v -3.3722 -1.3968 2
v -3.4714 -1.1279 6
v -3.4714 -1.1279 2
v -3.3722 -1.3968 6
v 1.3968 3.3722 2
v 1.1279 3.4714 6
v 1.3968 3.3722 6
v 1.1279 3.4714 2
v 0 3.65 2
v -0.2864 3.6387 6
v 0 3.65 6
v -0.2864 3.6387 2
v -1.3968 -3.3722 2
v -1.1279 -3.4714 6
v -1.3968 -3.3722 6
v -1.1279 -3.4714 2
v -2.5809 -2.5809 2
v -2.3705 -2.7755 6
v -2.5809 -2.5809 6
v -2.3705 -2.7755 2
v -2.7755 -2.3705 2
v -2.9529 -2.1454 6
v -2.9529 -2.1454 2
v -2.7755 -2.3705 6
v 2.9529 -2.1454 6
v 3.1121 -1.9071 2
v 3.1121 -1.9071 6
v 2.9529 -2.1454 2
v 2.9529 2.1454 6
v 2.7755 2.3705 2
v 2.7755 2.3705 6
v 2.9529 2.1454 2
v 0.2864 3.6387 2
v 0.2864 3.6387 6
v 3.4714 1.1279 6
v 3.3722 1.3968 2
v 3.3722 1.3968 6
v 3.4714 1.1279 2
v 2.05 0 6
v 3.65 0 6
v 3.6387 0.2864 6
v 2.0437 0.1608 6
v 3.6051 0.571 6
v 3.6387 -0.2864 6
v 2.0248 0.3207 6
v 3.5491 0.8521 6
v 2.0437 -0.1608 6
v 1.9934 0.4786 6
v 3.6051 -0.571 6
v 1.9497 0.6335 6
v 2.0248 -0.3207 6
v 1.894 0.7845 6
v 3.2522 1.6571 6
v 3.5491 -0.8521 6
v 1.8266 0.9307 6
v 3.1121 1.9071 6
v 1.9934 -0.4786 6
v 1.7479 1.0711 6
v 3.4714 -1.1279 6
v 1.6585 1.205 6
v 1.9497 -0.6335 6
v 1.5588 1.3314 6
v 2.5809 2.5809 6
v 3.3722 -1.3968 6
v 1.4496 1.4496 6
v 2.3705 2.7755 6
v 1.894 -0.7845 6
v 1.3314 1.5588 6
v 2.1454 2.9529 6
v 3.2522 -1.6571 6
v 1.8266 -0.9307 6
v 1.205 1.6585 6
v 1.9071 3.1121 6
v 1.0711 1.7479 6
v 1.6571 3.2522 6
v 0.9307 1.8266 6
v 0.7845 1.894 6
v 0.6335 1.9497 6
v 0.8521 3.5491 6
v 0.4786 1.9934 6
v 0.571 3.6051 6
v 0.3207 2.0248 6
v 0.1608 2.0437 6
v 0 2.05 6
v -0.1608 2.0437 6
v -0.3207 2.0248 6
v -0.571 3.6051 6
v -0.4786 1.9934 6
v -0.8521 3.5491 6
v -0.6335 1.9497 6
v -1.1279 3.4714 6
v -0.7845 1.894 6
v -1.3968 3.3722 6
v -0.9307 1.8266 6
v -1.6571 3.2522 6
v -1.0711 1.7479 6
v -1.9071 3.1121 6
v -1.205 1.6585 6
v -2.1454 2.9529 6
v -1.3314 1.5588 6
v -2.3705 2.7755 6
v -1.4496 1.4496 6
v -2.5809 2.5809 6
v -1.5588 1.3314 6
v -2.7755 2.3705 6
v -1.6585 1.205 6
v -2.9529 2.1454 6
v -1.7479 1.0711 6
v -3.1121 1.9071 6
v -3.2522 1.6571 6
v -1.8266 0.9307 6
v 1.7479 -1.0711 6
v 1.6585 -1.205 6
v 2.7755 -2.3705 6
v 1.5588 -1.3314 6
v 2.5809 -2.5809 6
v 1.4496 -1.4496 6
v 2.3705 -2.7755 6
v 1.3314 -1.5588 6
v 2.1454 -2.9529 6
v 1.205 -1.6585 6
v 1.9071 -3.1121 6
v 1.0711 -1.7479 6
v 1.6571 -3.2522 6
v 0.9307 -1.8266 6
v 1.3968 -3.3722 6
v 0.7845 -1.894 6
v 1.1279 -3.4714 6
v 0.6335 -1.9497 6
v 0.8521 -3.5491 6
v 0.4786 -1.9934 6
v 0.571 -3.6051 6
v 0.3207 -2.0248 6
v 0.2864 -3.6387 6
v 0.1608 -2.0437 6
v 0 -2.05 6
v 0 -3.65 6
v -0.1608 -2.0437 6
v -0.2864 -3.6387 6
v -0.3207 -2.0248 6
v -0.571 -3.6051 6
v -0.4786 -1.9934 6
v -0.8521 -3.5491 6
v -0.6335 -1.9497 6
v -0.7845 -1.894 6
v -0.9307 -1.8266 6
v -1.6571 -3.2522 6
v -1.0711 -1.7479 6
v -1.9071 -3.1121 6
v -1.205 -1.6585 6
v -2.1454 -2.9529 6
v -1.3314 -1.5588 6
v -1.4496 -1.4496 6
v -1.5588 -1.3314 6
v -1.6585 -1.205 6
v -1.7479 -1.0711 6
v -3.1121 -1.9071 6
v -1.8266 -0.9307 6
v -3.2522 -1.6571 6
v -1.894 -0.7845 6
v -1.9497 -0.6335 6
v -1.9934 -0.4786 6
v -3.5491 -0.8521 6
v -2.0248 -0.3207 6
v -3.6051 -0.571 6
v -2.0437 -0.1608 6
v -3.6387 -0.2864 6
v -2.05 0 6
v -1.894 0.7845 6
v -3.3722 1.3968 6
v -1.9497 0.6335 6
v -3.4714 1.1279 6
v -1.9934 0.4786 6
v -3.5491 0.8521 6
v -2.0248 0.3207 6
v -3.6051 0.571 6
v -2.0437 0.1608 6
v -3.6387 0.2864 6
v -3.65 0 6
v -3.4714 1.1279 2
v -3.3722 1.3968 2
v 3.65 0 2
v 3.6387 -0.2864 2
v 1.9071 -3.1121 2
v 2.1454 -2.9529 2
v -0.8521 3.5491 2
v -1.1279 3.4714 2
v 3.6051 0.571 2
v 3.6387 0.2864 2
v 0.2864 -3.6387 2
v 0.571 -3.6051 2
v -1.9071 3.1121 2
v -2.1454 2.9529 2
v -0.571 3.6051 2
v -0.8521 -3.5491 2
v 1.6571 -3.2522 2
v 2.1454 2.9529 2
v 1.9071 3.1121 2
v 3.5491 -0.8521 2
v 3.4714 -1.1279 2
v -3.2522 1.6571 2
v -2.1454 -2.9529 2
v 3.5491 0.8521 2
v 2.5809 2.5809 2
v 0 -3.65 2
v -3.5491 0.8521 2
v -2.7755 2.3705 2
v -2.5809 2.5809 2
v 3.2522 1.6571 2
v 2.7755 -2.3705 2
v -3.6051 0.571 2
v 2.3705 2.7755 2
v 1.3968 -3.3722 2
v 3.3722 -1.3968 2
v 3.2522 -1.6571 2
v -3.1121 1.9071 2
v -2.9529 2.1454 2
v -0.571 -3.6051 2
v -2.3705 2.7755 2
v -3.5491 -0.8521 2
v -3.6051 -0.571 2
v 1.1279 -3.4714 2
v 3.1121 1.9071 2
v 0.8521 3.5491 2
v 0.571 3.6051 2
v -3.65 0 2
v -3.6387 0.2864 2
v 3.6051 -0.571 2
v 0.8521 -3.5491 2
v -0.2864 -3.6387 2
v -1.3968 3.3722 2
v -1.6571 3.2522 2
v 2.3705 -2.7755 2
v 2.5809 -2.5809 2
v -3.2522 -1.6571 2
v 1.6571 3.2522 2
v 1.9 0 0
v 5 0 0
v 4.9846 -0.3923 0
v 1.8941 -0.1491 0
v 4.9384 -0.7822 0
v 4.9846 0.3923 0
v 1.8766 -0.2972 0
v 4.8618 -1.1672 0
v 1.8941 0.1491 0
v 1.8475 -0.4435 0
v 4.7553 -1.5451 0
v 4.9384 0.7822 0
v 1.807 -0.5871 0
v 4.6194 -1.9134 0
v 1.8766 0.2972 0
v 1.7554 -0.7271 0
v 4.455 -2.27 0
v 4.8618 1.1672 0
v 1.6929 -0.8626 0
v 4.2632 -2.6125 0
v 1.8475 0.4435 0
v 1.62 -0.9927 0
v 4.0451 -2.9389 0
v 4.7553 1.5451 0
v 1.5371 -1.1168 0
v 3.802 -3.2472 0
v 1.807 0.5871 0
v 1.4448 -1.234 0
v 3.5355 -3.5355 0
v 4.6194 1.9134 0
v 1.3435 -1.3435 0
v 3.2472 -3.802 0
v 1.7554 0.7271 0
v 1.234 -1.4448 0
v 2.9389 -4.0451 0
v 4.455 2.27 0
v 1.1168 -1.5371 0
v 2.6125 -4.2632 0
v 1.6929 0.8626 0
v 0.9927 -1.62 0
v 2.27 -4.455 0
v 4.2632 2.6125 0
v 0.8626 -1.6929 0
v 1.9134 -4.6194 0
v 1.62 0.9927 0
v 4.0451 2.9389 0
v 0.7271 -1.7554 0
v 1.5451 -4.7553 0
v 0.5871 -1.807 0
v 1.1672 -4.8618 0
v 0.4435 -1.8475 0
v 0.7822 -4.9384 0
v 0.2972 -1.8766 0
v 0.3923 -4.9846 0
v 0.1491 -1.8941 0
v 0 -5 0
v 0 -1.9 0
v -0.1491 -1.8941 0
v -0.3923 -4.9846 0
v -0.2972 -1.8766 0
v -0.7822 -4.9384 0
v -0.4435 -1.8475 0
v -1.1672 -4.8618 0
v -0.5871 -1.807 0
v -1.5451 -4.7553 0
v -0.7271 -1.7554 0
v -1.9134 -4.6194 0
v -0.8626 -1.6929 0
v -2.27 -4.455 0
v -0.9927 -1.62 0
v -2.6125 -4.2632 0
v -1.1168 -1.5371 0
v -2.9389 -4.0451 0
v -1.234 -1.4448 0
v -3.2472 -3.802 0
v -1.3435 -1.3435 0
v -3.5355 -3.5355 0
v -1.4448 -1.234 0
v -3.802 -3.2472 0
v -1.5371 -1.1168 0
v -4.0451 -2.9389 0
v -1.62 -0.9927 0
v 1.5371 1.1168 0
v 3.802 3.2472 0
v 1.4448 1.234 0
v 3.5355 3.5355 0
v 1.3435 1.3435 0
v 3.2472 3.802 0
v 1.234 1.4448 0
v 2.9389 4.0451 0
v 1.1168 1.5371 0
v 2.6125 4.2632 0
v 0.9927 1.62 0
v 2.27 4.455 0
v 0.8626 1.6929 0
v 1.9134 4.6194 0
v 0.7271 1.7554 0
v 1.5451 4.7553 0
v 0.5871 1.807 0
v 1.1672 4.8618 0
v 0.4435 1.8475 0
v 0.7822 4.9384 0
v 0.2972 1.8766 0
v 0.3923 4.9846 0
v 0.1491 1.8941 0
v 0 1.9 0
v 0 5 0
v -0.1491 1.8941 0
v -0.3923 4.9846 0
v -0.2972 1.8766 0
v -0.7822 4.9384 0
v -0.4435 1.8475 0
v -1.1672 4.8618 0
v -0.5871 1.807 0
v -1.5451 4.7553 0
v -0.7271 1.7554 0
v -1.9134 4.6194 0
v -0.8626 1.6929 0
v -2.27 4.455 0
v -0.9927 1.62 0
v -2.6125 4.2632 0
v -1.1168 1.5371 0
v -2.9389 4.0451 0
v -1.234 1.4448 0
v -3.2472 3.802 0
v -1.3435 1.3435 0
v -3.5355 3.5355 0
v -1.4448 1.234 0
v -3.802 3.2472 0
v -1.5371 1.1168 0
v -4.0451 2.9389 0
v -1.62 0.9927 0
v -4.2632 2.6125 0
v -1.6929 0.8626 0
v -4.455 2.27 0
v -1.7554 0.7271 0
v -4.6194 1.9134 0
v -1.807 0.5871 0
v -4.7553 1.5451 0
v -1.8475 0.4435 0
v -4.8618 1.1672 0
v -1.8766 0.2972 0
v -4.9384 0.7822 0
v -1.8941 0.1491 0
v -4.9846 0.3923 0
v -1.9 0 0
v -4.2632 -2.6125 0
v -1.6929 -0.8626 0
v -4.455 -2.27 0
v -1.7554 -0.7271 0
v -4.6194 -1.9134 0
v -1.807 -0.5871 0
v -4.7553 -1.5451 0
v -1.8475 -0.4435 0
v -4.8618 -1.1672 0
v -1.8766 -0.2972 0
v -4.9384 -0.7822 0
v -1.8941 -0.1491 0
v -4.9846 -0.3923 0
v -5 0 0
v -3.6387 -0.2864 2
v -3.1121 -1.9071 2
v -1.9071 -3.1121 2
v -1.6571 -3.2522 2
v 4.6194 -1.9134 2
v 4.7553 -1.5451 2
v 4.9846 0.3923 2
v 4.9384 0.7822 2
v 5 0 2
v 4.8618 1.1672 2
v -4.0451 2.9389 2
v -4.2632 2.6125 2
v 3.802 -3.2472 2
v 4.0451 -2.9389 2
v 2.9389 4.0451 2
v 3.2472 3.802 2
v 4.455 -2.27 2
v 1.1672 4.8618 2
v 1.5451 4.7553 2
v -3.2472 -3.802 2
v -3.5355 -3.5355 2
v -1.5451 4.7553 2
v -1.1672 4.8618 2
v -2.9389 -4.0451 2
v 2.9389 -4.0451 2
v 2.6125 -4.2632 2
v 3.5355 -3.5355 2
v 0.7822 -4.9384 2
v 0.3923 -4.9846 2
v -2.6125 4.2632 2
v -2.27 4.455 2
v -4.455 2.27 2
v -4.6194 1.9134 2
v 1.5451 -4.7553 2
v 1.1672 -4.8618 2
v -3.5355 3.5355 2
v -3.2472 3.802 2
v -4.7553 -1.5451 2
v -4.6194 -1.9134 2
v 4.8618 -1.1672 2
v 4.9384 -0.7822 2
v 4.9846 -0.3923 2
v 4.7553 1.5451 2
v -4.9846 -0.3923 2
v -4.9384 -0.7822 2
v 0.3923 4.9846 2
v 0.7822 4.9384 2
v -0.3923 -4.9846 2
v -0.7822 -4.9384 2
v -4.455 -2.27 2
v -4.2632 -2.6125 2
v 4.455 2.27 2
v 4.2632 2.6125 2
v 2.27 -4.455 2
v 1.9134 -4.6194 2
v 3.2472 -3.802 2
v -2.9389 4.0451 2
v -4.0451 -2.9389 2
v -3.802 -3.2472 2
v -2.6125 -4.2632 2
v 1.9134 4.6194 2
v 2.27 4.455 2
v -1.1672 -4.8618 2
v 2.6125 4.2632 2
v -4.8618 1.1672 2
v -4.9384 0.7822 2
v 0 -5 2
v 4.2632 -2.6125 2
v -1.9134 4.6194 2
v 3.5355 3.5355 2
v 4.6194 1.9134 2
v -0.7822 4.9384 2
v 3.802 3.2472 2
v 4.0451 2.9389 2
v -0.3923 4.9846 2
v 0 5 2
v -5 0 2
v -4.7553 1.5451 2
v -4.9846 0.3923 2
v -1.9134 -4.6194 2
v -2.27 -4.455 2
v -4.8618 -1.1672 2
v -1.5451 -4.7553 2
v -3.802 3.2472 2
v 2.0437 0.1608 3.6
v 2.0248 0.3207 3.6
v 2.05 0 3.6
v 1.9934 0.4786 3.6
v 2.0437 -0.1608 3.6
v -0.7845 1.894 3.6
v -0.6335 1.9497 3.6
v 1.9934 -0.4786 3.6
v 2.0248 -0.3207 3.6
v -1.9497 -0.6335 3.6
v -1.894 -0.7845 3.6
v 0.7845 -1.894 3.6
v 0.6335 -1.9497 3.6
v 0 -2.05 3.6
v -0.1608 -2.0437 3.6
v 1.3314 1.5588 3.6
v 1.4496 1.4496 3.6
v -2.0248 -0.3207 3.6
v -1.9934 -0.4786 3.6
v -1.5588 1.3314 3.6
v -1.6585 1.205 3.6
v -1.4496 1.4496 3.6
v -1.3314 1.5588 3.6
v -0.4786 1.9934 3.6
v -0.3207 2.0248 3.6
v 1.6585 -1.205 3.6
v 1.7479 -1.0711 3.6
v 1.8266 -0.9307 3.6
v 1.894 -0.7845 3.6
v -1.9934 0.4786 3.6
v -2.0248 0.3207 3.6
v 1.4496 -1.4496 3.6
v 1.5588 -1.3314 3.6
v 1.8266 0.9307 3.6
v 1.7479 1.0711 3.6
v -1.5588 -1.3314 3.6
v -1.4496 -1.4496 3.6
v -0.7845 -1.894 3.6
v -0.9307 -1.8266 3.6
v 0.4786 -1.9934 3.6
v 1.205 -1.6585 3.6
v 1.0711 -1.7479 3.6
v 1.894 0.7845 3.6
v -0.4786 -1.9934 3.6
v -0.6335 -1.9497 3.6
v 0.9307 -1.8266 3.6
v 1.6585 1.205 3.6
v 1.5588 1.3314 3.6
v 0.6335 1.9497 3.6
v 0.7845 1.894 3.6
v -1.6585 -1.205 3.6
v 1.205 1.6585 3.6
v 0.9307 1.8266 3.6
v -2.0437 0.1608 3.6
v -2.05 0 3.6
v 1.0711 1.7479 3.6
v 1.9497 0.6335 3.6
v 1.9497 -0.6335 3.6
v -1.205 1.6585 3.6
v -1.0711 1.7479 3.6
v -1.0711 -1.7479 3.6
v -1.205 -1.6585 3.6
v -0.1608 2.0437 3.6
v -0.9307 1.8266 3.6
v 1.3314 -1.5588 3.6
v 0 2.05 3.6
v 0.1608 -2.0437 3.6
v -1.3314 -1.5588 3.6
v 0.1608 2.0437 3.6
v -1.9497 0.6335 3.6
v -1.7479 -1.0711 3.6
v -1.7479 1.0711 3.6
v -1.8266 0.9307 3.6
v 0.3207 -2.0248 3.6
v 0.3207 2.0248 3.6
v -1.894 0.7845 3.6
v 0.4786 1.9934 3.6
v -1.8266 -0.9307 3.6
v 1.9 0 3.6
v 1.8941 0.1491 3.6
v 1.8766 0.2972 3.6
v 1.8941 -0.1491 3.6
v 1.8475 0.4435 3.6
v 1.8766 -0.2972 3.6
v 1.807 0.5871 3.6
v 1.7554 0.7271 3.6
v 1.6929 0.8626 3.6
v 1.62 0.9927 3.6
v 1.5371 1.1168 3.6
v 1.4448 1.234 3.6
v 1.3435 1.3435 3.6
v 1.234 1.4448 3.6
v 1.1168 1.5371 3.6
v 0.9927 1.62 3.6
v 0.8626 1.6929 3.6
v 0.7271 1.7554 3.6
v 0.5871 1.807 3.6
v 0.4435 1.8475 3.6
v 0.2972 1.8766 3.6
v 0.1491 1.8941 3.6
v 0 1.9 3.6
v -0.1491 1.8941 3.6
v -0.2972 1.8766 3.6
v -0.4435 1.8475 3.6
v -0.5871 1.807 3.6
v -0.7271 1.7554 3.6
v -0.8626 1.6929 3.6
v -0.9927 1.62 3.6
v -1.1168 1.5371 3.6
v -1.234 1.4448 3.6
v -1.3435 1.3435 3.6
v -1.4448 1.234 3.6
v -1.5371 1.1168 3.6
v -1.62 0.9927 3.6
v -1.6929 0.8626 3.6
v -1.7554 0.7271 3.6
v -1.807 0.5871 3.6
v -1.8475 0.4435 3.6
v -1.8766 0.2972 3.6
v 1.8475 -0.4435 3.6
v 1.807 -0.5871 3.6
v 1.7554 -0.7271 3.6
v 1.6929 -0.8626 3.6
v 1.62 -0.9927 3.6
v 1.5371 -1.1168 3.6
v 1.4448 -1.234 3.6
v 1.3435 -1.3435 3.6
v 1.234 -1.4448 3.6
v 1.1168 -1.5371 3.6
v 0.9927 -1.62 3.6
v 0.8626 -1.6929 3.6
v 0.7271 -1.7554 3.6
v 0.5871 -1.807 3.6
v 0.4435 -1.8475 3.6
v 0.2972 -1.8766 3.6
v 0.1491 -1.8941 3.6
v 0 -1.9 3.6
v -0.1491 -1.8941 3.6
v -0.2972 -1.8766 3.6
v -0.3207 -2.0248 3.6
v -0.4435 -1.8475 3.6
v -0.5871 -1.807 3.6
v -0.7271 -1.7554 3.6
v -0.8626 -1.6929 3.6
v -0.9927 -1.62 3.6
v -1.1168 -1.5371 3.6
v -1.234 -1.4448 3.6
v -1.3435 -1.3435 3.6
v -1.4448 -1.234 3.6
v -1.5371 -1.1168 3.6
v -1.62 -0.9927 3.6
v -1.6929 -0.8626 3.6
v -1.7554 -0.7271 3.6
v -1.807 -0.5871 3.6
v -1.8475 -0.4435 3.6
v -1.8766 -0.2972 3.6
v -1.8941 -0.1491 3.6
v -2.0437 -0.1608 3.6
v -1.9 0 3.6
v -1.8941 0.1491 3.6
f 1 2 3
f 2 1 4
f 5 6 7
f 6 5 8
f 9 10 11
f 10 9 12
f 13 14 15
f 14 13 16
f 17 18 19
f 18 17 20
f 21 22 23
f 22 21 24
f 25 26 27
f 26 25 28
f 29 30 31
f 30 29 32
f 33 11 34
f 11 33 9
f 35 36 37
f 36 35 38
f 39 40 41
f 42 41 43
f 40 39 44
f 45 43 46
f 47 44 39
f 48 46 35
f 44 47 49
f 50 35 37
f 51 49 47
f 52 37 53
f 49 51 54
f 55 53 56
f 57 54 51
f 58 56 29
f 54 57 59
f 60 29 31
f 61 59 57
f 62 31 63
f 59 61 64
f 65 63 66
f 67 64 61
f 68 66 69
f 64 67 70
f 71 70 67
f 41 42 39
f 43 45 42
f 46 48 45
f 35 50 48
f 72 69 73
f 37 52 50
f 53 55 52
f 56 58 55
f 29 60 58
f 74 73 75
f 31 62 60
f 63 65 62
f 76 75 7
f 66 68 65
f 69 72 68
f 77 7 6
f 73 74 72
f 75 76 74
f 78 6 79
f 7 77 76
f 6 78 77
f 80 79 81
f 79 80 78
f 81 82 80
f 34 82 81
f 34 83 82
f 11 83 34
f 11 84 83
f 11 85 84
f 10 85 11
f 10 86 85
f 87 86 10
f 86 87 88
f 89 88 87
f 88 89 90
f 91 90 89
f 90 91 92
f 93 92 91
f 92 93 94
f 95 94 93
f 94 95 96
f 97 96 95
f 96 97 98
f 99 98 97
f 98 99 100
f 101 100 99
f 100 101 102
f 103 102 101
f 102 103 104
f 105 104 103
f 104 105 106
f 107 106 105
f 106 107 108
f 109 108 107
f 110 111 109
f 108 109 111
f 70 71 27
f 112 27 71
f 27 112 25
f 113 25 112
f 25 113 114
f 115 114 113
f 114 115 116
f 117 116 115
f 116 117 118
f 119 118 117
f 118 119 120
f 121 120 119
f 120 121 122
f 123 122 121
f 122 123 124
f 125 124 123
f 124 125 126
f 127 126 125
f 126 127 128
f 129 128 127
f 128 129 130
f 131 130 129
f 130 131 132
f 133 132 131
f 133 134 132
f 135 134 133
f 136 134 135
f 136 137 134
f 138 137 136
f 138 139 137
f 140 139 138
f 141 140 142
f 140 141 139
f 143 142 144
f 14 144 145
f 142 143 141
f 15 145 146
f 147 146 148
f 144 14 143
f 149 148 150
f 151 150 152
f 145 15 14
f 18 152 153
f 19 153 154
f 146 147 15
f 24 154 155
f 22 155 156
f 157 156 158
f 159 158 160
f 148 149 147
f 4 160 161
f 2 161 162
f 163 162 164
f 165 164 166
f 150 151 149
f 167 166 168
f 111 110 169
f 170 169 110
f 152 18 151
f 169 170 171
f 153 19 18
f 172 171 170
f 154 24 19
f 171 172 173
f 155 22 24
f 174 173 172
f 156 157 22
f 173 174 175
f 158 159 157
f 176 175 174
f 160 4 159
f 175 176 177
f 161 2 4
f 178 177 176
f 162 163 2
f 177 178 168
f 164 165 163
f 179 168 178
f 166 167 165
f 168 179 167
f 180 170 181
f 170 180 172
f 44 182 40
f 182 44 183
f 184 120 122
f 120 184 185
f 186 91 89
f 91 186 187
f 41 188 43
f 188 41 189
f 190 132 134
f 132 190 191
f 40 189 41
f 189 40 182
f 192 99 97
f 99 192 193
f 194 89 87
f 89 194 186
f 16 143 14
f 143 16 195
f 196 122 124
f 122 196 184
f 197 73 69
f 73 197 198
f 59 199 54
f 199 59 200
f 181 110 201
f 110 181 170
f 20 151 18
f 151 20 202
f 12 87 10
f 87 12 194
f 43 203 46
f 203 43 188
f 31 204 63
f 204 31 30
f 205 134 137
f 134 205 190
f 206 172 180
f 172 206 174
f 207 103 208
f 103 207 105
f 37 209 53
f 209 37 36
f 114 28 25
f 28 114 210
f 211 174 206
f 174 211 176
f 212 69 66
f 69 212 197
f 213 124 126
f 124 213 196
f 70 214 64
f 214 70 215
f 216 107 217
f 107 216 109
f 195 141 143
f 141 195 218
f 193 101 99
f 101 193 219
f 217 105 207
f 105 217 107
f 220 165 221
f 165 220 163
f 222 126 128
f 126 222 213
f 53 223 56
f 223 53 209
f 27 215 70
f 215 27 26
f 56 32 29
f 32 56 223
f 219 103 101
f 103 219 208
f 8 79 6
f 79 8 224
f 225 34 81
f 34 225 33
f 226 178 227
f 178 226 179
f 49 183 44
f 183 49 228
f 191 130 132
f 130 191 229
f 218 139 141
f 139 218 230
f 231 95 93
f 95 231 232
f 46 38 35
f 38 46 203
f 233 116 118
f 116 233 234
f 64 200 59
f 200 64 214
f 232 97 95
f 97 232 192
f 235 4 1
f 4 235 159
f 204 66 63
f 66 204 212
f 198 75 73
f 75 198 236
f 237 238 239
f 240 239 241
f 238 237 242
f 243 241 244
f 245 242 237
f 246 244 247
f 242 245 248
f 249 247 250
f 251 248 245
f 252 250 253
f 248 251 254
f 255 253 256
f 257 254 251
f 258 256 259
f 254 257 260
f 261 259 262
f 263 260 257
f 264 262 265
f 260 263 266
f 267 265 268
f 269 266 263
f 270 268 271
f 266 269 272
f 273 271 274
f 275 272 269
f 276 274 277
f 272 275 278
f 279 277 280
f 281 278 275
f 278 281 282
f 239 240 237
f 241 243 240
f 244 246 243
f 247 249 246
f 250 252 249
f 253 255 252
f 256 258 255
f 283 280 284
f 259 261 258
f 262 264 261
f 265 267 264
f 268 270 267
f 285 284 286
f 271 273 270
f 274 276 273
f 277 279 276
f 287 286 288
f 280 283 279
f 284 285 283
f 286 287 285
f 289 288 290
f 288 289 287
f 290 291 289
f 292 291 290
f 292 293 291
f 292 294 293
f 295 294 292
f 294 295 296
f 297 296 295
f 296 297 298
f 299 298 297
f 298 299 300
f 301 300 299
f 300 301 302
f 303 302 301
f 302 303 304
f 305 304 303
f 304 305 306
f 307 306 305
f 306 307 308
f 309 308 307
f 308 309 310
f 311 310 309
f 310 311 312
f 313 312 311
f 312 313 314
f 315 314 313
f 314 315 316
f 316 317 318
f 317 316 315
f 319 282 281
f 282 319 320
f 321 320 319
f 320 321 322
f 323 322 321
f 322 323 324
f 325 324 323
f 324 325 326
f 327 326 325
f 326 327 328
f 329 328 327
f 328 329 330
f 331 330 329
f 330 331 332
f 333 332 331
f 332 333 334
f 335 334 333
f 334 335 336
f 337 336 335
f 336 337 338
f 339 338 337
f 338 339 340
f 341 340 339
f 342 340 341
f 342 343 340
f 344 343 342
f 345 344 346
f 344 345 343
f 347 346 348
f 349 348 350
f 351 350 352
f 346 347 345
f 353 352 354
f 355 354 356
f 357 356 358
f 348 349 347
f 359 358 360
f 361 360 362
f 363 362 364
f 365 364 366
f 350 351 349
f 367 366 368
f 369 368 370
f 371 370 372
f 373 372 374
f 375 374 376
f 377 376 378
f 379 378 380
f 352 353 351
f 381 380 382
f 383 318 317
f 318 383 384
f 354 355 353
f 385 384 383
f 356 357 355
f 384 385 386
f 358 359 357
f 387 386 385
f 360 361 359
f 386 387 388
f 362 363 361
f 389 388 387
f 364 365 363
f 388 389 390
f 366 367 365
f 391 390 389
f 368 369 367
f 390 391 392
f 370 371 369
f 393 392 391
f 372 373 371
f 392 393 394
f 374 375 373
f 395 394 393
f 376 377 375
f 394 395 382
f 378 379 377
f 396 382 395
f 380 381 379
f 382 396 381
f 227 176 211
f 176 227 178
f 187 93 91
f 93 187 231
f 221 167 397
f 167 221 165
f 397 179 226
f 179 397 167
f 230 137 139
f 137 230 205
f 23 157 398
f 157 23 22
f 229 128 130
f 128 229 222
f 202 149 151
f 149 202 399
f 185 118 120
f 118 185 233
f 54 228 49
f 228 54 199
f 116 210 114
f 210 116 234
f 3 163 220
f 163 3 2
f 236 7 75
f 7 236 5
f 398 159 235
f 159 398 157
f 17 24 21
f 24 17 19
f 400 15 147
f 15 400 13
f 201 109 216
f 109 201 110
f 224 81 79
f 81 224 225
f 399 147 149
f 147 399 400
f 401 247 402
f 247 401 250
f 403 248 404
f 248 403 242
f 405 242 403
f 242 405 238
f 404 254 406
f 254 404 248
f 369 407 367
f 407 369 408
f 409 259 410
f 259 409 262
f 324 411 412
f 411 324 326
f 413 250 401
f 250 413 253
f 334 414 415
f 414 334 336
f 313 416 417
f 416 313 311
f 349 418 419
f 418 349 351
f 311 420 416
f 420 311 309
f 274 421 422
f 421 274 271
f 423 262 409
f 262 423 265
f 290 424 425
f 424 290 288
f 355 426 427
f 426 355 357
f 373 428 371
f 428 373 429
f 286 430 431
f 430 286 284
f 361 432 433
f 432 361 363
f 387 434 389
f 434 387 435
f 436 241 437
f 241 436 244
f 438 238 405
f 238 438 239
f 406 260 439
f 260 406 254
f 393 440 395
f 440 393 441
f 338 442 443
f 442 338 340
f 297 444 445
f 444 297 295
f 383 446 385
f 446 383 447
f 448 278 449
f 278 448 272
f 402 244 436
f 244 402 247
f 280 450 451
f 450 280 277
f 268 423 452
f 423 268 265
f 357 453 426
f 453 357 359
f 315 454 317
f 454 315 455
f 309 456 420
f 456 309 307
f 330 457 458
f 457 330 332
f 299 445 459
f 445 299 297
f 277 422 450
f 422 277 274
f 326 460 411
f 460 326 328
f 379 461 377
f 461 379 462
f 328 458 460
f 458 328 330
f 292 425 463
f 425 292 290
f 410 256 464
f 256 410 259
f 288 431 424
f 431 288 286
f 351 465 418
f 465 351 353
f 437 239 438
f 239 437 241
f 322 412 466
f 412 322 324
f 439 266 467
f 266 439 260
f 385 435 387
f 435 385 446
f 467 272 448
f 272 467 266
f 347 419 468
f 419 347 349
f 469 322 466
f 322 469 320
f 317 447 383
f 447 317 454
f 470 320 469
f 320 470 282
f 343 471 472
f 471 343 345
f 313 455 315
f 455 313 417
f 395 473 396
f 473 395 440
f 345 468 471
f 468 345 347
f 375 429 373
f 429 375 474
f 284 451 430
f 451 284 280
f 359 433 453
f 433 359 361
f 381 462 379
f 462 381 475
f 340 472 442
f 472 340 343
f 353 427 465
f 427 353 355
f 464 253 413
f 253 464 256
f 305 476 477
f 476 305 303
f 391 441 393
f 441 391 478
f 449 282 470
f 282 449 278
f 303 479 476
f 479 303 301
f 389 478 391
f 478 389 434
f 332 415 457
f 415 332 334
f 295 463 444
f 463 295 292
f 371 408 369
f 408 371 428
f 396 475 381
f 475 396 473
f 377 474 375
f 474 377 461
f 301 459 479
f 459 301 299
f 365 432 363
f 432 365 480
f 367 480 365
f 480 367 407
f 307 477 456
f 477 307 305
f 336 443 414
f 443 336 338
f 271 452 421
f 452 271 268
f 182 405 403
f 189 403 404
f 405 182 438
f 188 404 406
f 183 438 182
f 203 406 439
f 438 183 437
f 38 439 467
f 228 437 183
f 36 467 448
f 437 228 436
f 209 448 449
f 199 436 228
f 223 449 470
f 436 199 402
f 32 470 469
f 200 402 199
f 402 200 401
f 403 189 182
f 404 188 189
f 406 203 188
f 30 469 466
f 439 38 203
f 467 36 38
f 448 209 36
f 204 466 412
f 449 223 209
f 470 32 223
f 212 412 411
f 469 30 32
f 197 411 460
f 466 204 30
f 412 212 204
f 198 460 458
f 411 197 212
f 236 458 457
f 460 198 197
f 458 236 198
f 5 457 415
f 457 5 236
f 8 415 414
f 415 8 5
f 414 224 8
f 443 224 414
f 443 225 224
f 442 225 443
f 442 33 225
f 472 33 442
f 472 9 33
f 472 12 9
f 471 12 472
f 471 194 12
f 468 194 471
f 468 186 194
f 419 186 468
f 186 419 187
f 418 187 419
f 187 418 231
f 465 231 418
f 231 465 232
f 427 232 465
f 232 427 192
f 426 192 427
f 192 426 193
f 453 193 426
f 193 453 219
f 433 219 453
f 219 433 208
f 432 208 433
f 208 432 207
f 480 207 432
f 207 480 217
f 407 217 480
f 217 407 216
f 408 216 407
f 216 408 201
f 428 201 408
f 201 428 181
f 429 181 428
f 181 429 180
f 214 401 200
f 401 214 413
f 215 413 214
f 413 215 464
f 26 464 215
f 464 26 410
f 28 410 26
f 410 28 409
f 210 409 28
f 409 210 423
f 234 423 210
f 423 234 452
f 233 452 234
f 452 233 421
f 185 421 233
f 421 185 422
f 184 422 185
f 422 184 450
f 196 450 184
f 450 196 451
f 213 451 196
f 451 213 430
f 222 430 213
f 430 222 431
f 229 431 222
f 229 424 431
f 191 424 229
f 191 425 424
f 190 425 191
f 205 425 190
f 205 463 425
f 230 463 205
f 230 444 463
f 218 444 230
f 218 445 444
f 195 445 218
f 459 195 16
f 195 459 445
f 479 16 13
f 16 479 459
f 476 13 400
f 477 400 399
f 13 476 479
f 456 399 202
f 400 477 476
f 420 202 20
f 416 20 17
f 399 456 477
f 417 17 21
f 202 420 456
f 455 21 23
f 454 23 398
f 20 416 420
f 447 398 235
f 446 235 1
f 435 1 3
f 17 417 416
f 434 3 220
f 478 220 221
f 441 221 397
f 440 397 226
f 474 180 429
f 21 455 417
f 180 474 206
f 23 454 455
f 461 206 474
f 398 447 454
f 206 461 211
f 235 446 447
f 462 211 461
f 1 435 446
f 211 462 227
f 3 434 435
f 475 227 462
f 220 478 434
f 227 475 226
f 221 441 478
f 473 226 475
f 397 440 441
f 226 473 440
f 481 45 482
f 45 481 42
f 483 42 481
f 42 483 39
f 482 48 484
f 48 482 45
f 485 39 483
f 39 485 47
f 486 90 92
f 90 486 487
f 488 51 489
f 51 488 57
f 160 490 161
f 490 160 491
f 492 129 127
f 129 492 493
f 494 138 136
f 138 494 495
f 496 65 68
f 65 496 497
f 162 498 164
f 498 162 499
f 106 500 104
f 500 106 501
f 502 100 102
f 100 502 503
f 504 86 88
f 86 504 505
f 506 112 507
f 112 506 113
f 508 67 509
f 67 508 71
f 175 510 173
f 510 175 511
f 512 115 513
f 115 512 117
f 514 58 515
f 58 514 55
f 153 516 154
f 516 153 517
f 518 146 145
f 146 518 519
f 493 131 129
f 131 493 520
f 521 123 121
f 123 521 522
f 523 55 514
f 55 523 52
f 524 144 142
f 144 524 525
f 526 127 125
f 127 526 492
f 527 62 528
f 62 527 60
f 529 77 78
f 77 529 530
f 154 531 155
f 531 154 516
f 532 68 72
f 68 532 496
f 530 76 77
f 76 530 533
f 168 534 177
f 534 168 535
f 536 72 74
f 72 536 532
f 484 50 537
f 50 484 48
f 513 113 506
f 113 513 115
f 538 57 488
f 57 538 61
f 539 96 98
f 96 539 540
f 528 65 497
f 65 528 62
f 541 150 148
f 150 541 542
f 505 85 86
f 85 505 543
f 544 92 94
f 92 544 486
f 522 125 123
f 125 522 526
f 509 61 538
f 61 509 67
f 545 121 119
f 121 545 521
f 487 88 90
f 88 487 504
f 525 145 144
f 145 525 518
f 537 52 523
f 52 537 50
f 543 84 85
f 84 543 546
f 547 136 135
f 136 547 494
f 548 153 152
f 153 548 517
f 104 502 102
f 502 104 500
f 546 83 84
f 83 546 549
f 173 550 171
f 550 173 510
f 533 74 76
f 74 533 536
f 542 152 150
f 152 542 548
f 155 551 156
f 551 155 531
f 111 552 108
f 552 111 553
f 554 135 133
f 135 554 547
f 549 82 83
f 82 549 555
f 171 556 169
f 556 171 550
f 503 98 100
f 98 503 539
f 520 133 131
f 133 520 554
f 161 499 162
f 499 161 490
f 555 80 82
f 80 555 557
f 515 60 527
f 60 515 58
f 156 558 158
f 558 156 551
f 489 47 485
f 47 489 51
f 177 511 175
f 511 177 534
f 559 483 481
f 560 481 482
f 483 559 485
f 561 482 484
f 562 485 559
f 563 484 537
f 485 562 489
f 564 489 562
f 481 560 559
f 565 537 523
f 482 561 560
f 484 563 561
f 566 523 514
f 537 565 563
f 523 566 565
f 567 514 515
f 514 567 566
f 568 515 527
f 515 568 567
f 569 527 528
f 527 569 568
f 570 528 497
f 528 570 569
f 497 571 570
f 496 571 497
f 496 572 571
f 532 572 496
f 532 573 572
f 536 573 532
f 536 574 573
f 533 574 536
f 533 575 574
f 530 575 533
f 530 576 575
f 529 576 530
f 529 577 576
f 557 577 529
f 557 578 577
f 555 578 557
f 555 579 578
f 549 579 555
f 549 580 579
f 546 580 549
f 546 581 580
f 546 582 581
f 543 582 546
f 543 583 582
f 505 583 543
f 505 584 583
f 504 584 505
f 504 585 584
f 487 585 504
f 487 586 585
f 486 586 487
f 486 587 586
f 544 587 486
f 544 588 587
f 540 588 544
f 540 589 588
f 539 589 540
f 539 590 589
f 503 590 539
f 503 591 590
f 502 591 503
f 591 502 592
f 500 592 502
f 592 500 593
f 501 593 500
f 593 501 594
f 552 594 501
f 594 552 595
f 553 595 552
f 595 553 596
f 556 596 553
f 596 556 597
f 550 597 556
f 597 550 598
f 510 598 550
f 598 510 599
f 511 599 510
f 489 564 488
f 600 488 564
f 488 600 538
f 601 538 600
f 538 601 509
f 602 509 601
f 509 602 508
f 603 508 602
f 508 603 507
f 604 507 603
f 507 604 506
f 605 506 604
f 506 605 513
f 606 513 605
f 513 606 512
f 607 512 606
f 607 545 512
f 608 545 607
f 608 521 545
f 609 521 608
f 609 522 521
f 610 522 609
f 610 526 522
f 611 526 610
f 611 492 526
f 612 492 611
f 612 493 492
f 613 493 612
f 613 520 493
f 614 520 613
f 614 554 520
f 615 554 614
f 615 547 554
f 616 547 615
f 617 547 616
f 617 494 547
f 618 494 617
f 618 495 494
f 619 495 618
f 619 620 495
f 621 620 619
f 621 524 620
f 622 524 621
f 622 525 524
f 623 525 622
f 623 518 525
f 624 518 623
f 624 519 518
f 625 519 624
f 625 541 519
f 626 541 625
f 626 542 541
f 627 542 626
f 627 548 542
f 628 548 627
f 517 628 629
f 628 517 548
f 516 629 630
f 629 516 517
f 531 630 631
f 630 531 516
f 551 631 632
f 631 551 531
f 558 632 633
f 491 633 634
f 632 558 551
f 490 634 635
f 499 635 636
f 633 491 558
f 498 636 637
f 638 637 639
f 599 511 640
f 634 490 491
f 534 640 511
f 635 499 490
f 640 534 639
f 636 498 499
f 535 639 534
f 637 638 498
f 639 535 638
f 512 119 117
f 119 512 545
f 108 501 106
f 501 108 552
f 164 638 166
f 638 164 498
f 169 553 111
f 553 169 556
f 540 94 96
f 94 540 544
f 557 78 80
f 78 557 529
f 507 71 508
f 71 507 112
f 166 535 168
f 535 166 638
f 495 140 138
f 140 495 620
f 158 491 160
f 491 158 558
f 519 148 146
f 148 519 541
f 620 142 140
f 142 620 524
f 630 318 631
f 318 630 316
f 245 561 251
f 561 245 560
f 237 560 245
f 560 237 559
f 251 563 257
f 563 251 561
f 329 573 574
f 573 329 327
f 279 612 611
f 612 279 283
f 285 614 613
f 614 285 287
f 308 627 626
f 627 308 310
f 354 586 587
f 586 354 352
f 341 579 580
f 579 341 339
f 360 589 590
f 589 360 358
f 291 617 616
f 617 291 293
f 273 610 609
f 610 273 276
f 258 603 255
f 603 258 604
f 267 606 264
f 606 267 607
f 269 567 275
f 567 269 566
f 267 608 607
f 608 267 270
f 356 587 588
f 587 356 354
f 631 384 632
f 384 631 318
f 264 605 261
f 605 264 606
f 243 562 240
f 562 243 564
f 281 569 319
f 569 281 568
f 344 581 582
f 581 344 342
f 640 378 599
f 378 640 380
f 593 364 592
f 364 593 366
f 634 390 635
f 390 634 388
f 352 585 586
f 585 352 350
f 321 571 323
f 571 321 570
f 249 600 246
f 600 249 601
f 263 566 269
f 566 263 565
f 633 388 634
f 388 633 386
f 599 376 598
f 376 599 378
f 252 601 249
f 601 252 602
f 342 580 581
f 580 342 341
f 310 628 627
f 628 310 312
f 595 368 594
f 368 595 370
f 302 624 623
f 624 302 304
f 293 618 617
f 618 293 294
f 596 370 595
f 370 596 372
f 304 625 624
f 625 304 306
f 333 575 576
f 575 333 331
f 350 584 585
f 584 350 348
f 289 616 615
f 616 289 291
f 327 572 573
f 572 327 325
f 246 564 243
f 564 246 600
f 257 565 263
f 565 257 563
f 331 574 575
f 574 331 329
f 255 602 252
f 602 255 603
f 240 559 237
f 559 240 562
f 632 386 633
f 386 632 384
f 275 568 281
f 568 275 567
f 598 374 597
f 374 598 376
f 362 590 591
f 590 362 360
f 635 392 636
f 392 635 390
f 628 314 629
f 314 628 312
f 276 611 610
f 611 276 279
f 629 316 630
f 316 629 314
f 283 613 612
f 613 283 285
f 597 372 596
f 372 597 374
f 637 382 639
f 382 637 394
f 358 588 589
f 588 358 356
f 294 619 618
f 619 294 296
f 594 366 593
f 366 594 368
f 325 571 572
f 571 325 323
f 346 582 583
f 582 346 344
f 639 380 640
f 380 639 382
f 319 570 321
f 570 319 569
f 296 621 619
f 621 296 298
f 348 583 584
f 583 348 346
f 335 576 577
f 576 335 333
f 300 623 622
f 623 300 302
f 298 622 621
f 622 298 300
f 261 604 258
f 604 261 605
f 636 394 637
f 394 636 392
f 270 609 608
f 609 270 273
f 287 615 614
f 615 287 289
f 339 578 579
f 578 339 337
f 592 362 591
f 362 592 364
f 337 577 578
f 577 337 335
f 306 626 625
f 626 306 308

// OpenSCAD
// Varies; size of bolt hole in top.
// D_BASE = 3.9; // standard bolt
//D_BASE = 1.8; // the little pins
D_BASE = 4.1;

// Varies; height of base ring.
//H_RIM = 4.0; 
//H_RIM = 3.5;
// H_RIM = 3.3;
H_RIM = 2.0;

// Varies; height of entire thing
//H = 6.5; // with raised header
H = 6.0; // with flat top

SQUARE_OFF = false;
SHORTEN_FRONT = false;

D_PLATE = 7.3; //7.8;
D_TACTILE = 3.8;
H_TACTILE = 3.0;
D_PIN = 3.8;  
H_BASE = 2.4;

D_RIM = 10.0;
SQUARE = SHORTEN_FRONT ? 3.5 : D_RIM/2;

$fn = 80;

difference() 
{
    union() {
        cylinder(h=H, d=D_PLATE);
        if (SQUARE_OFF) {
            R = 1.0;
            hull() {
                translate([D_RIM/2-R, SQUARE-R, 0]) cylinder(h=H_RIM, r=R);
                translate([D_RIM/2-R, -D_RIM/2+R, 0]) cylinder(h=H_RIM, r=R);
                translate([-D_RIM/2+R, SQUARE-R, 0]) cylinder(h=H_RIM, r=R);
                translate([-D_RIM/2+R, -D_RIM/2+R, 0]) cylinder(h=H_RIM, r=R);
            }
        }
        else {
            cylinder(h=H_RIM, d=D_RIM);
        }
    }
    // top part
    translate([0, 0, H - H_BASE]) 
        cylinder(h=H_BASE, d=D_BASE);

    // pin
    cylinder(h=H, d=D_PIN);

    // switch
    cylinder(h=H_TACTILE, d=D_TACTILE);
    H_CONE = (D_TACTILE - D_PIN)/2;
    translate([0, 0, H_TACTILE]) 
        cylinder(h=H_CONE, d=D_TACTILE);

    if (SHORTEN_FRONT) {
        translate([-10, SQUARE, 0]) cube(size=[20, 20, 20]);
    }
}
